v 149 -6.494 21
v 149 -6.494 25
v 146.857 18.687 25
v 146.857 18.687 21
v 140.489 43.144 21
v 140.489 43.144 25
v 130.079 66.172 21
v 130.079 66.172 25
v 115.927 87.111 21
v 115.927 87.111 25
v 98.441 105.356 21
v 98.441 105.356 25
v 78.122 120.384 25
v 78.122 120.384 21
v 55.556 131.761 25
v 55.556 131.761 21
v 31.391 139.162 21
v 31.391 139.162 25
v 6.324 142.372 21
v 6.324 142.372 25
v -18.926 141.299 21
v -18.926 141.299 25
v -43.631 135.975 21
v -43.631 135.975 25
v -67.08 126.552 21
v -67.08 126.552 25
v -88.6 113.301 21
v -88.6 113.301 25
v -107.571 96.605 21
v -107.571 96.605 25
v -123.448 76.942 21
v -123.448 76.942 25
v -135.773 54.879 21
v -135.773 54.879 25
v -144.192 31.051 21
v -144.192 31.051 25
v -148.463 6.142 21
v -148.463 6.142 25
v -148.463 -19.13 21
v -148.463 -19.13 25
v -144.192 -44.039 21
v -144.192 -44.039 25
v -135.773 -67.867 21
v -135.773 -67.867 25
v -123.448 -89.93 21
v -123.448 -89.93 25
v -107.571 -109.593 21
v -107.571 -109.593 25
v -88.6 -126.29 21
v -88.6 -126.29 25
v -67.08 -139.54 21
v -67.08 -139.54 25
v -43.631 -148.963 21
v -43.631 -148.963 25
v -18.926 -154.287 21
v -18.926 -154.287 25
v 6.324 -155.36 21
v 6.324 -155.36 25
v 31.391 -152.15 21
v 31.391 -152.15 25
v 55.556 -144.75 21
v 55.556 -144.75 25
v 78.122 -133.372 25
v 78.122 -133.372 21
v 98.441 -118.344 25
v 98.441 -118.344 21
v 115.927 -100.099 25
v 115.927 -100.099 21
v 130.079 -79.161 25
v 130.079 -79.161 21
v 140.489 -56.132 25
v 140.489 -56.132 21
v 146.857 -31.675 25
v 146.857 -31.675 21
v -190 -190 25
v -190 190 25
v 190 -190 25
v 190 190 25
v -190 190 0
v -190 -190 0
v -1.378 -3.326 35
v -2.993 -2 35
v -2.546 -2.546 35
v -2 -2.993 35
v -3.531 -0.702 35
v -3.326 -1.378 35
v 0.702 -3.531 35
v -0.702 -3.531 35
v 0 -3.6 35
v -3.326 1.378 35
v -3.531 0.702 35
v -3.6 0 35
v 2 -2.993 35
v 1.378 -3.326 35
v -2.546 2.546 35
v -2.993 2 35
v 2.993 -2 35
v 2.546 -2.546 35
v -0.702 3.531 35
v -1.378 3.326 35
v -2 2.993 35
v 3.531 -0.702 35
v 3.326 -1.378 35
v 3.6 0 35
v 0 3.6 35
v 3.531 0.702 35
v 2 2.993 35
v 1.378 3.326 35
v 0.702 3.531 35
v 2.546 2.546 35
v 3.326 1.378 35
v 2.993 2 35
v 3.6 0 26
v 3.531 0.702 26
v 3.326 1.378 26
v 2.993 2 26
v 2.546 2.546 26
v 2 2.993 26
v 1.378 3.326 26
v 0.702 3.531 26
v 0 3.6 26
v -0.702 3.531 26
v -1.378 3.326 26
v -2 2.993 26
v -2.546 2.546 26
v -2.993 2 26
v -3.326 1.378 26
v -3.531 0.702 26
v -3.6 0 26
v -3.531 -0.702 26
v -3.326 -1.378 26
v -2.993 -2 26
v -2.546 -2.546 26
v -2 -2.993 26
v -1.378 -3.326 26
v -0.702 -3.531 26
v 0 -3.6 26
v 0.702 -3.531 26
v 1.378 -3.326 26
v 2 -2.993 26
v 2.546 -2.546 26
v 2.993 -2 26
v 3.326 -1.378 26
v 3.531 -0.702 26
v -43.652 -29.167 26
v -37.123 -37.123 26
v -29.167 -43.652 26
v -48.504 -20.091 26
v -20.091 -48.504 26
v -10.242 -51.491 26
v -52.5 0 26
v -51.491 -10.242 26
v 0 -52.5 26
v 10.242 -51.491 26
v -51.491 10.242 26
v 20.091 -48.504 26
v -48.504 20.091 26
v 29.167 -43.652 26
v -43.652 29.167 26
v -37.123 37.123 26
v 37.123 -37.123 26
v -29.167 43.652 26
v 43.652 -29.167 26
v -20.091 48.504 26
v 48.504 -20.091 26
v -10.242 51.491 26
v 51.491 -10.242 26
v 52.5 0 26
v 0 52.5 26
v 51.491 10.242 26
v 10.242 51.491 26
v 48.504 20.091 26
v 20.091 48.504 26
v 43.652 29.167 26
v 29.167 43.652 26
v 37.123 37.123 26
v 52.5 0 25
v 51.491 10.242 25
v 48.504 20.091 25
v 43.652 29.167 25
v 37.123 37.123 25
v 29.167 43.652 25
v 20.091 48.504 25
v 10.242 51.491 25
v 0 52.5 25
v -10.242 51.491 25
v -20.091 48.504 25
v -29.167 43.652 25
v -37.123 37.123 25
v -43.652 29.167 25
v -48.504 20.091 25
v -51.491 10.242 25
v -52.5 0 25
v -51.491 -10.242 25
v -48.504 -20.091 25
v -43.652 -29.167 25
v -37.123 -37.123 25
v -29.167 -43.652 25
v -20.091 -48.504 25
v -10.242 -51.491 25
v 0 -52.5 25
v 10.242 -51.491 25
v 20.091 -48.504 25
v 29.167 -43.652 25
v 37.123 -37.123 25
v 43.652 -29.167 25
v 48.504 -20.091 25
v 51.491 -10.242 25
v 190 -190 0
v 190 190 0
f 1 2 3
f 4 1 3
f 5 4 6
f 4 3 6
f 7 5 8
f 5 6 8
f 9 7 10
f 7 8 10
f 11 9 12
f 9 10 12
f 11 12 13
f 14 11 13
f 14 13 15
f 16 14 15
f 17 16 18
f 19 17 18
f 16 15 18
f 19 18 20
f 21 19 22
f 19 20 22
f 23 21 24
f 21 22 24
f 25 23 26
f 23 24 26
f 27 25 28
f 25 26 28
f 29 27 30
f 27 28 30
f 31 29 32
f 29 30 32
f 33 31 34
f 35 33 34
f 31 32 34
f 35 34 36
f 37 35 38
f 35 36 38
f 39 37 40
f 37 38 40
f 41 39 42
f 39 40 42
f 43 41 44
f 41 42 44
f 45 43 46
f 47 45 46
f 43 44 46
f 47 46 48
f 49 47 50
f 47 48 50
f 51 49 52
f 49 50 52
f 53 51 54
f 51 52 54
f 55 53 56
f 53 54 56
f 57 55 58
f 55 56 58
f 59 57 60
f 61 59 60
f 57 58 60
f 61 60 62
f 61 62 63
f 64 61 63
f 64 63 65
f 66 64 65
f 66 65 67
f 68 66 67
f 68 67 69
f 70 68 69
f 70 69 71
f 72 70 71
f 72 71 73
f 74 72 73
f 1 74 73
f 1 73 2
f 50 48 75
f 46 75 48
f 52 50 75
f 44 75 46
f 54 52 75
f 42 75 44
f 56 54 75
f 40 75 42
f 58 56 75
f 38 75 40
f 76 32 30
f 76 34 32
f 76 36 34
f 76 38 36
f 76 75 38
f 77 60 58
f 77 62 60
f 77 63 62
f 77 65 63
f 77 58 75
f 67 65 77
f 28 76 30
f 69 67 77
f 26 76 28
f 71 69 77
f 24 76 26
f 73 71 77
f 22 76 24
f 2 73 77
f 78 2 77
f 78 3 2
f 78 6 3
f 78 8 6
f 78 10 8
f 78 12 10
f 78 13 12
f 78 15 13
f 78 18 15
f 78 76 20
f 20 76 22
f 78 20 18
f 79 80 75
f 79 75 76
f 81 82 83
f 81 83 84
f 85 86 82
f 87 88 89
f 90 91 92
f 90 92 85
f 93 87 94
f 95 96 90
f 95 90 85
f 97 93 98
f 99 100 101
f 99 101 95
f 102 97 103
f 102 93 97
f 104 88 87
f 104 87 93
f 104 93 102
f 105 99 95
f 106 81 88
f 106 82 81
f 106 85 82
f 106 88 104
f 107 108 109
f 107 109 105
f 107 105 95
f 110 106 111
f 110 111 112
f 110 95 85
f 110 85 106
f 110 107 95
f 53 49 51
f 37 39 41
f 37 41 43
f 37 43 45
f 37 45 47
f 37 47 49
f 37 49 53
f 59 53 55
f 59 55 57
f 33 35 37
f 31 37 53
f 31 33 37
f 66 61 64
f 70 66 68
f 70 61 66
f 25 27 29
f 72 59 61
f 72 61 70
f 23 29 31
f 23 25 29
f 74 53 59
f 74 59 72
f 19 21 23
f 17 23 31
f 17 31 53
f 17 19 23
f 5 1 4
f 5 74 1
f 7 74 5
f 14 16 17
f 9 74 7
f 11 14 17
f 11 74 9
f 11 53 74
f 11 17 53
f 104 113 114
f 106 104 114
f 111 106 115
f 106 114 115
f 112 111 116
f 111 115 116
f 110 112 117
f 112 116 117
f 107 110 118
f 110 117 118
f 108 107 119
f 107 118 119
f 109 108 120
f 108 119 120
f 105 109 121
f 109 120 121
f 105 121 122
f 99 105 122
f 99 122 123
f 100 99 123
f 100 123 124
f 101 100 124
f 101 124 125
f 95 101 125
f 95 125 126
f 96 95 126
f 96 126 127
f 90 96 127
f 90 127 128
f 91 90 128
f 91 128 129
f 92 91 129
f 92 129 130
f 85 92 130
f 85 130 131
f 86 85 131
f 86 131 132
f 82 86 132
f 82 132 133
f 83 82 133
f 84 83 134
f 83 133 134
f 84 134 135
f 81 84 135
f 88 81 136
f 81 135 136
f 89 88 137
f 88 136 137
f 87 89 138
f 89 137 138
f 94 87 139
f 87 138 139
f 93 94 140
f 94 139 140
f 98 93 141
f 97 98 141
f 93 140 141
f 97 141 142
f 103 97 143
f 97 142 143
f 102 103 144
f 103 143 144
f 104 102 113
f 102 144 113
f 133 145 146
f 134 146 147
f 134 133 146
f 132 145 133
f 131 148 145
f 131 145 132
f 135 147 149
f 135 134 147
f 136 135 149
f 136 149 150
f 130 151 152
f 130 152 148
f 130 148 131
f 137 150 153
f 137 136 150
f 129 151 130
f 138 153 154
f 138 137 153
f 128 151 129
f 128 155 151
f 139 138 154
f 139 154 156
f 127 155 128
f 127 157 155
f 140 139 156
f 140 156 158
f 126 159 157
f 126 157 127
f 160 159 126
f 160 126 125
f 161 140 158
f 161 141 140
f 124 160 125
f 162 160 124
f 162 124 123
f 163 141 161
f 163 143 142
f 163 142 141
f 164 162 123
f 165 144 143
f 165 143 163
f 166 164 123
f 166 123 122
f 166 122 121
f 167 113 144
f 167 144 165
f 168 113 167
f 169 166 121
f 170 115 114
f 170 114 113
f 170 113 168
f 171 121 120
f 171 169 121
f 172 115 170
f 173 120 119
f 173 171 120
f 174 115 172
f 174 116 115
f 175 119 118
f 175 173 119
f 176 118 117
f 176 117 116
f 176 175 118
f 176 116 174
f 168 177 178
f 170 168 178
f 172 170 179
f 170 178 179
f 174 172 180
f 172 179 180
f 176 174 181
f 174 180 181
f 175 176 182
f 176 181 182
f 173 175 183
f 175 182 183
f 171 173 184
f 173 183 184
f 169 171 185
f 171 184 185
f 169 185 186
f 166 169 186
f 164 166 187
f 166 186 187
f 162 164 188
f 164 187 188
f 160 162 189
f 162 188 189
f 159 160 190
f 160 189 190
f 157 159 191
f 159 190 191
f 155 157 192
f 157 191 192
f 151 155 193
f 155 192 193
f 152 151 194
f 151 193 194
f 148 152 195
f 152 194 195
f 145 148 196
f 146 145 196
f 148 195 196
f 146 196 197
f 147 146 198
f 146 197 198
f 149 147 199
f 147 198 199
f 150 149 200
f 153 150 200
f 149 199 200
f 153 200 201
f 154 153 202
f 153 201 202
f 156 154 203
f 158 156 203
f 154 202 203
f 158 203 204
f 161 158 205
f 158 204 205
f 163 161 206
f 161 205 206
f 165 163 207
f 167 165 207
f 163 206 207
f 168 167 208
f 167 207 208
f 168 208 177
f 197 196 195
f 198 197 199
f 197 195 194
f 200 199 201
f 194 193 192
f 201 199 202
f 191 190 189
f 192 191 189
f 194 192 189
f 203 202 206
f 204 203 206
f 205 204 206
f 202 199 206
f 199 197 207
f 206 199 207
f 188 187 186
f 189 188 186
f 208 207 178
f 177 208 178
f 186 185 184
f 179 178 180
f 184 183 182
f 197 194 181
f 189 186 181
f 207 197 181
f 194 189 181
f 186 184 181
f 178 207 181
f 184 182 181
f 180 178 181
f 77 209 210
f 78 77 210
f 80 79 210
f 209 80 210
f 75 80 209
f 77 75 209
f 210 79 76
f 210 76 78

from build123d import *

# Parameters (mm, degrees)
F0_W     = 380
F0_H     = 380
F1_DEPTH = 25
F2_R     = 149
F3_DEPTH = 4
F4_R     = 52.5
F5_DEPTH = 1
F6_R     = 3.6
F7_DEPTH = 10


with BuildPart() as f1:
    # F0 (on Top) → F1 (new body)
    with BuildSketch(Plane.XY):
        Rectangle(F0_W, F0_H)
    extrude(amount=F1_DEPTH)

    # F2 (on face) → F3 (cut)
    with BuildSketch(Plane.XY.offset(25)):
        with Locations((0, -6.494125)):
            Circle(F2_R)
    extrude(amount=-F3_DEPTH, mode=Mode.SUBTRACT)


with BuildPart() as f5:
    # F4 (on face) → F5 (new body)
    with BuildSketch(Plane.XY.offset(25)):
        Circle(F4_R)
    extrude(amount=F5_DEPTH)

    # F6 (on face) → F7 (join)
    with BuildSketch(Plane.XY.offset(25)):
        Circle(F6_R)
    extrude(amount=F7_DEPTH)


solid = Compound([f1.part, f5.part])
